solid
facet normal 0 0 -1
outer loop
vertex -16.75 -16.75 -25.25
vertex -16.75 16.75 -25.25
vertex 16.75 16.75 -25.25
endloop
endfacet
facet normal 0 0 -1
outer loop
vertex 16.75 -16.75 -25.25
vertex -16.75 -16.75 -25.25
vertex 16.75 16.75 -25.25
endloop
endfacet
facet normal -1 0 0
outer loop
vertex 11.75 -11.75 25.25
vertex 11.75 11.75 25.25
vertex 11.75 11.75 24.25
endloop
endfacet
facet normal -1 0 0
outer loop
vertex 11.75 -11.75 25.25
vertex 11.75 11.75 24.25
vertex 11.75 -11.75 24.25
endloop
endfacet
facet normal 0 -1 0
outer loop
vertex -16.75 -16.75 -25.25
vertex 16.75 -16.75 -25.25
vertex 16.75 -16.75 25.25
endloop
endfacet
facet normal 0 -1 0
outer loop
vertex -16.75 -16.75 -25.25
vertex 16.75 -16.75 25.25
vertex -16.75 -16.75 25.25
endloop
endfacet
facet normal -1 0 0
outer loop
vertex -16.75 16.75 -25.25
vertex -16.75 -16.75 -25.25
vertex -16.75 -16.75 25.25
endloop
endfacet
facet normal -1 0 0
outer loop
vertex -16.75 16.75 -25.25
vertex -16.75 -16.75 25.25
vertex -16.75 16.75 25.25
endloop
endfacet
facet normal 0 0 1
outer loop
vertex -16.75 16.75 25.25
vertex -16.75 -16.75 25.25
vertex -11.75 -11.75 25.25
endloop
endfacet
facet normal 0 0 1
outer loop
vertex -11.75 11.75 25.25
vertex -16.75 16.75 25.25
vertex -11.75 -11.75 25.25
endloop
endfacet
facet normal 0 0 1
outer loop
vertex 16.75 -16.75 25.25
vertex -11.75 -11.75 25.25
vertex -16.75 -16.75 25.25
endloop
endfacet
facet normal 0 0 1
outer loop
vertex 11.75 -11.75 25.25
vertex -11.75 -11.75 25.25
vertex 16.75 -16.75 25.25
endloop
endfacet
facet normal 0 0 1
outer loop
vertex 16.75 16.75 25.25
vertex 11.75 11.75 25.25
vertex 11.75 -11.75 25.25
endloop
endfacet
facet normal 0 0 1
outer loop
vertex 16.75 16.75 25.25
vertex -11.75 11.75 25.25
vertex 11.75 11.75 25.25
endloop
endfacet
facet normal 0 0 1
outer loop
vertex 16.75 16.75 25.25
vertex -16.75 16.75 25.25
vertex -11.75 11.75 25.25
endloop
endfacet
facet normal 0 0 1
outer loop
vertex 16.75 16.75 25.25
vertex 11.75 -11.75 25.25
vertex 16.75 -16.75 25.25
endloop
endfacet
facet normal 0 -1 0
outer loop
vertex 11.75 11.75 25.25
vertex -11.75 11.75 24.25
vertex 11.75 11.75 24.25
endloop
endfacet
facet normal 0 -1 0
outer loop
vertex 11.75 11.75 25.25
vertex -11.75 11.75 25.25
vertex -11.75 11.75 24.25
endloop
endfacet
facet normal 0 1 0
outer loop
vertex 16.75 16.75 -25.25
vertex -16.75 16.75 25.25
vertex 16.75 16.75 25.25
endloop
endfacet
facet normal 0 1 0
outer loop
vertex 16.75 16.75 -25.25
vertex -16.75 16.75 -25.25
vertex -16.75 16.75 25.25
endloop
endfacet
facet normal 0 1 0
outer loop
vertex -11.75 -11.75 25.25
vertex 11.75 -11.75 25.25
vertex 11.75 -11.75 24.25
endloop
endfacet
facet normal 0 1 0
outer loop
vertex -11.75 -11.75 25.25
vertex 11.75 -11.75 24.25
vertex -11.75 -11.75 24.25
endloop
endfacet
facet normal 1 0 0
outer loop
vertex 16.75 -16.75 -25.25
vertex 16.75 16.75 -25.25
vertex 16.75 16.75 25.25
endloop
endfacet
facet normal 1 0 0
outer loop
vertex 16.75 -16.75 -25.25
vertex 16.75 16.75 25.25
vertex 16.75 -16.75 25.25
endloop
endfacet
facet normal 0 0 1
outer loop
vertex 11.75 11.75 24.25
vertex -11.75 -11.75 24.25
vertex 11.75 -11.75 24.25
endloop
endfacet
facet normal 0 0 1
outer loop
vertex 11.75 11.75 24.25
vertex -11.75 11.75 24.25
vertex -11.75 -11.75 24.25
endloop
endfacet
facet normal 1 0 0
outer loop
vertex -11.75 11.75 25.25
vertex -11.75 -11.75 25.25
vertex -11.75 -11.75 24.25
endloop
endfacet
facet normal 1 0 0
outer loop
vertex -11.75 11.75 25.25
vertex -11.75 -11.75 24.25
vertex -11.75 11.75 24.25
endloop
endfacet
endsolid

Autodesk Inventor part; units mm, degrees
ref_plane "YZ Plane" through (0, 0, 0) normal (1, 0, 0) x (0, 1, 0)
ref_plane "XZ Plane" through (0, 0, 0) normal (0, 1, 0) x (-1, 0, 0)
ref_plane "XY Plane" through (0, 0, 0) normal (0, 0, 1) x (1, 0, 0)
sketch "Sketch1" plane through (0, 0, 0) normal (0, 0, 1) x (1, 0, 0)
  line L0 (-16.75, 16.75) -> (16.75, 16.75)
  line L1 (16.75, 16.75) -> (16.75, -16.75)
  line L2 (16.75, -16.75) -> (-16.75, -16.75)
  line L3 (-16.75, -16.75) -> (-16.75, 16.75)
  line L4 (-16.75, 16.75) -> (16.75, -16.75) construction
  line L5 (16.75, 16.75) -> (-16.75, -16.75) construction
  point P0 (0, 0)
  dimension "d0" = 33.5
  dimension "d1" = 33.5
extrude "Extrusion1" add sketch "Sketch1" along normal mid plane 50.5
sketch "Sketch2" plane through (0, 0, 25.25) normal (0, 0, 1) x (1, 0, 0)
  line L0 (-11.75, 11.75) -> (11.75, 11.75)
  line L1 (11.75, 11.75) -> (11.75, -11.75)
  line L2 (11.75, -11.75) -> (-11.75, -11.75)
  line L3 (-11.75, -11.75) -> (-11.75, 11.75)
  line L4 (-11.75, 11.75) -> (11.75, -11.75) construction
  line L5 (11.75, 11.75) -> (-11.75, -11.75) construction
  line L6 (16.75, 16.75) -> (-16.75, 16.75) projected
  line L7 (16.75, -16.75) -> (16.75, 16.75) projected
  point P0 (0, 0)
  dimension "d4" = 5
  dimension "d5" = 5
extrude "Extrusion2" cut sketch "Sketch2" against normal blind 1
sketch "Sketch3" plane through (0, 0, -25.25) normal (0, 0, -1) x (-1, 0, 0)
  point P0 (0, 0)
properties part number "acrylicpmt"
